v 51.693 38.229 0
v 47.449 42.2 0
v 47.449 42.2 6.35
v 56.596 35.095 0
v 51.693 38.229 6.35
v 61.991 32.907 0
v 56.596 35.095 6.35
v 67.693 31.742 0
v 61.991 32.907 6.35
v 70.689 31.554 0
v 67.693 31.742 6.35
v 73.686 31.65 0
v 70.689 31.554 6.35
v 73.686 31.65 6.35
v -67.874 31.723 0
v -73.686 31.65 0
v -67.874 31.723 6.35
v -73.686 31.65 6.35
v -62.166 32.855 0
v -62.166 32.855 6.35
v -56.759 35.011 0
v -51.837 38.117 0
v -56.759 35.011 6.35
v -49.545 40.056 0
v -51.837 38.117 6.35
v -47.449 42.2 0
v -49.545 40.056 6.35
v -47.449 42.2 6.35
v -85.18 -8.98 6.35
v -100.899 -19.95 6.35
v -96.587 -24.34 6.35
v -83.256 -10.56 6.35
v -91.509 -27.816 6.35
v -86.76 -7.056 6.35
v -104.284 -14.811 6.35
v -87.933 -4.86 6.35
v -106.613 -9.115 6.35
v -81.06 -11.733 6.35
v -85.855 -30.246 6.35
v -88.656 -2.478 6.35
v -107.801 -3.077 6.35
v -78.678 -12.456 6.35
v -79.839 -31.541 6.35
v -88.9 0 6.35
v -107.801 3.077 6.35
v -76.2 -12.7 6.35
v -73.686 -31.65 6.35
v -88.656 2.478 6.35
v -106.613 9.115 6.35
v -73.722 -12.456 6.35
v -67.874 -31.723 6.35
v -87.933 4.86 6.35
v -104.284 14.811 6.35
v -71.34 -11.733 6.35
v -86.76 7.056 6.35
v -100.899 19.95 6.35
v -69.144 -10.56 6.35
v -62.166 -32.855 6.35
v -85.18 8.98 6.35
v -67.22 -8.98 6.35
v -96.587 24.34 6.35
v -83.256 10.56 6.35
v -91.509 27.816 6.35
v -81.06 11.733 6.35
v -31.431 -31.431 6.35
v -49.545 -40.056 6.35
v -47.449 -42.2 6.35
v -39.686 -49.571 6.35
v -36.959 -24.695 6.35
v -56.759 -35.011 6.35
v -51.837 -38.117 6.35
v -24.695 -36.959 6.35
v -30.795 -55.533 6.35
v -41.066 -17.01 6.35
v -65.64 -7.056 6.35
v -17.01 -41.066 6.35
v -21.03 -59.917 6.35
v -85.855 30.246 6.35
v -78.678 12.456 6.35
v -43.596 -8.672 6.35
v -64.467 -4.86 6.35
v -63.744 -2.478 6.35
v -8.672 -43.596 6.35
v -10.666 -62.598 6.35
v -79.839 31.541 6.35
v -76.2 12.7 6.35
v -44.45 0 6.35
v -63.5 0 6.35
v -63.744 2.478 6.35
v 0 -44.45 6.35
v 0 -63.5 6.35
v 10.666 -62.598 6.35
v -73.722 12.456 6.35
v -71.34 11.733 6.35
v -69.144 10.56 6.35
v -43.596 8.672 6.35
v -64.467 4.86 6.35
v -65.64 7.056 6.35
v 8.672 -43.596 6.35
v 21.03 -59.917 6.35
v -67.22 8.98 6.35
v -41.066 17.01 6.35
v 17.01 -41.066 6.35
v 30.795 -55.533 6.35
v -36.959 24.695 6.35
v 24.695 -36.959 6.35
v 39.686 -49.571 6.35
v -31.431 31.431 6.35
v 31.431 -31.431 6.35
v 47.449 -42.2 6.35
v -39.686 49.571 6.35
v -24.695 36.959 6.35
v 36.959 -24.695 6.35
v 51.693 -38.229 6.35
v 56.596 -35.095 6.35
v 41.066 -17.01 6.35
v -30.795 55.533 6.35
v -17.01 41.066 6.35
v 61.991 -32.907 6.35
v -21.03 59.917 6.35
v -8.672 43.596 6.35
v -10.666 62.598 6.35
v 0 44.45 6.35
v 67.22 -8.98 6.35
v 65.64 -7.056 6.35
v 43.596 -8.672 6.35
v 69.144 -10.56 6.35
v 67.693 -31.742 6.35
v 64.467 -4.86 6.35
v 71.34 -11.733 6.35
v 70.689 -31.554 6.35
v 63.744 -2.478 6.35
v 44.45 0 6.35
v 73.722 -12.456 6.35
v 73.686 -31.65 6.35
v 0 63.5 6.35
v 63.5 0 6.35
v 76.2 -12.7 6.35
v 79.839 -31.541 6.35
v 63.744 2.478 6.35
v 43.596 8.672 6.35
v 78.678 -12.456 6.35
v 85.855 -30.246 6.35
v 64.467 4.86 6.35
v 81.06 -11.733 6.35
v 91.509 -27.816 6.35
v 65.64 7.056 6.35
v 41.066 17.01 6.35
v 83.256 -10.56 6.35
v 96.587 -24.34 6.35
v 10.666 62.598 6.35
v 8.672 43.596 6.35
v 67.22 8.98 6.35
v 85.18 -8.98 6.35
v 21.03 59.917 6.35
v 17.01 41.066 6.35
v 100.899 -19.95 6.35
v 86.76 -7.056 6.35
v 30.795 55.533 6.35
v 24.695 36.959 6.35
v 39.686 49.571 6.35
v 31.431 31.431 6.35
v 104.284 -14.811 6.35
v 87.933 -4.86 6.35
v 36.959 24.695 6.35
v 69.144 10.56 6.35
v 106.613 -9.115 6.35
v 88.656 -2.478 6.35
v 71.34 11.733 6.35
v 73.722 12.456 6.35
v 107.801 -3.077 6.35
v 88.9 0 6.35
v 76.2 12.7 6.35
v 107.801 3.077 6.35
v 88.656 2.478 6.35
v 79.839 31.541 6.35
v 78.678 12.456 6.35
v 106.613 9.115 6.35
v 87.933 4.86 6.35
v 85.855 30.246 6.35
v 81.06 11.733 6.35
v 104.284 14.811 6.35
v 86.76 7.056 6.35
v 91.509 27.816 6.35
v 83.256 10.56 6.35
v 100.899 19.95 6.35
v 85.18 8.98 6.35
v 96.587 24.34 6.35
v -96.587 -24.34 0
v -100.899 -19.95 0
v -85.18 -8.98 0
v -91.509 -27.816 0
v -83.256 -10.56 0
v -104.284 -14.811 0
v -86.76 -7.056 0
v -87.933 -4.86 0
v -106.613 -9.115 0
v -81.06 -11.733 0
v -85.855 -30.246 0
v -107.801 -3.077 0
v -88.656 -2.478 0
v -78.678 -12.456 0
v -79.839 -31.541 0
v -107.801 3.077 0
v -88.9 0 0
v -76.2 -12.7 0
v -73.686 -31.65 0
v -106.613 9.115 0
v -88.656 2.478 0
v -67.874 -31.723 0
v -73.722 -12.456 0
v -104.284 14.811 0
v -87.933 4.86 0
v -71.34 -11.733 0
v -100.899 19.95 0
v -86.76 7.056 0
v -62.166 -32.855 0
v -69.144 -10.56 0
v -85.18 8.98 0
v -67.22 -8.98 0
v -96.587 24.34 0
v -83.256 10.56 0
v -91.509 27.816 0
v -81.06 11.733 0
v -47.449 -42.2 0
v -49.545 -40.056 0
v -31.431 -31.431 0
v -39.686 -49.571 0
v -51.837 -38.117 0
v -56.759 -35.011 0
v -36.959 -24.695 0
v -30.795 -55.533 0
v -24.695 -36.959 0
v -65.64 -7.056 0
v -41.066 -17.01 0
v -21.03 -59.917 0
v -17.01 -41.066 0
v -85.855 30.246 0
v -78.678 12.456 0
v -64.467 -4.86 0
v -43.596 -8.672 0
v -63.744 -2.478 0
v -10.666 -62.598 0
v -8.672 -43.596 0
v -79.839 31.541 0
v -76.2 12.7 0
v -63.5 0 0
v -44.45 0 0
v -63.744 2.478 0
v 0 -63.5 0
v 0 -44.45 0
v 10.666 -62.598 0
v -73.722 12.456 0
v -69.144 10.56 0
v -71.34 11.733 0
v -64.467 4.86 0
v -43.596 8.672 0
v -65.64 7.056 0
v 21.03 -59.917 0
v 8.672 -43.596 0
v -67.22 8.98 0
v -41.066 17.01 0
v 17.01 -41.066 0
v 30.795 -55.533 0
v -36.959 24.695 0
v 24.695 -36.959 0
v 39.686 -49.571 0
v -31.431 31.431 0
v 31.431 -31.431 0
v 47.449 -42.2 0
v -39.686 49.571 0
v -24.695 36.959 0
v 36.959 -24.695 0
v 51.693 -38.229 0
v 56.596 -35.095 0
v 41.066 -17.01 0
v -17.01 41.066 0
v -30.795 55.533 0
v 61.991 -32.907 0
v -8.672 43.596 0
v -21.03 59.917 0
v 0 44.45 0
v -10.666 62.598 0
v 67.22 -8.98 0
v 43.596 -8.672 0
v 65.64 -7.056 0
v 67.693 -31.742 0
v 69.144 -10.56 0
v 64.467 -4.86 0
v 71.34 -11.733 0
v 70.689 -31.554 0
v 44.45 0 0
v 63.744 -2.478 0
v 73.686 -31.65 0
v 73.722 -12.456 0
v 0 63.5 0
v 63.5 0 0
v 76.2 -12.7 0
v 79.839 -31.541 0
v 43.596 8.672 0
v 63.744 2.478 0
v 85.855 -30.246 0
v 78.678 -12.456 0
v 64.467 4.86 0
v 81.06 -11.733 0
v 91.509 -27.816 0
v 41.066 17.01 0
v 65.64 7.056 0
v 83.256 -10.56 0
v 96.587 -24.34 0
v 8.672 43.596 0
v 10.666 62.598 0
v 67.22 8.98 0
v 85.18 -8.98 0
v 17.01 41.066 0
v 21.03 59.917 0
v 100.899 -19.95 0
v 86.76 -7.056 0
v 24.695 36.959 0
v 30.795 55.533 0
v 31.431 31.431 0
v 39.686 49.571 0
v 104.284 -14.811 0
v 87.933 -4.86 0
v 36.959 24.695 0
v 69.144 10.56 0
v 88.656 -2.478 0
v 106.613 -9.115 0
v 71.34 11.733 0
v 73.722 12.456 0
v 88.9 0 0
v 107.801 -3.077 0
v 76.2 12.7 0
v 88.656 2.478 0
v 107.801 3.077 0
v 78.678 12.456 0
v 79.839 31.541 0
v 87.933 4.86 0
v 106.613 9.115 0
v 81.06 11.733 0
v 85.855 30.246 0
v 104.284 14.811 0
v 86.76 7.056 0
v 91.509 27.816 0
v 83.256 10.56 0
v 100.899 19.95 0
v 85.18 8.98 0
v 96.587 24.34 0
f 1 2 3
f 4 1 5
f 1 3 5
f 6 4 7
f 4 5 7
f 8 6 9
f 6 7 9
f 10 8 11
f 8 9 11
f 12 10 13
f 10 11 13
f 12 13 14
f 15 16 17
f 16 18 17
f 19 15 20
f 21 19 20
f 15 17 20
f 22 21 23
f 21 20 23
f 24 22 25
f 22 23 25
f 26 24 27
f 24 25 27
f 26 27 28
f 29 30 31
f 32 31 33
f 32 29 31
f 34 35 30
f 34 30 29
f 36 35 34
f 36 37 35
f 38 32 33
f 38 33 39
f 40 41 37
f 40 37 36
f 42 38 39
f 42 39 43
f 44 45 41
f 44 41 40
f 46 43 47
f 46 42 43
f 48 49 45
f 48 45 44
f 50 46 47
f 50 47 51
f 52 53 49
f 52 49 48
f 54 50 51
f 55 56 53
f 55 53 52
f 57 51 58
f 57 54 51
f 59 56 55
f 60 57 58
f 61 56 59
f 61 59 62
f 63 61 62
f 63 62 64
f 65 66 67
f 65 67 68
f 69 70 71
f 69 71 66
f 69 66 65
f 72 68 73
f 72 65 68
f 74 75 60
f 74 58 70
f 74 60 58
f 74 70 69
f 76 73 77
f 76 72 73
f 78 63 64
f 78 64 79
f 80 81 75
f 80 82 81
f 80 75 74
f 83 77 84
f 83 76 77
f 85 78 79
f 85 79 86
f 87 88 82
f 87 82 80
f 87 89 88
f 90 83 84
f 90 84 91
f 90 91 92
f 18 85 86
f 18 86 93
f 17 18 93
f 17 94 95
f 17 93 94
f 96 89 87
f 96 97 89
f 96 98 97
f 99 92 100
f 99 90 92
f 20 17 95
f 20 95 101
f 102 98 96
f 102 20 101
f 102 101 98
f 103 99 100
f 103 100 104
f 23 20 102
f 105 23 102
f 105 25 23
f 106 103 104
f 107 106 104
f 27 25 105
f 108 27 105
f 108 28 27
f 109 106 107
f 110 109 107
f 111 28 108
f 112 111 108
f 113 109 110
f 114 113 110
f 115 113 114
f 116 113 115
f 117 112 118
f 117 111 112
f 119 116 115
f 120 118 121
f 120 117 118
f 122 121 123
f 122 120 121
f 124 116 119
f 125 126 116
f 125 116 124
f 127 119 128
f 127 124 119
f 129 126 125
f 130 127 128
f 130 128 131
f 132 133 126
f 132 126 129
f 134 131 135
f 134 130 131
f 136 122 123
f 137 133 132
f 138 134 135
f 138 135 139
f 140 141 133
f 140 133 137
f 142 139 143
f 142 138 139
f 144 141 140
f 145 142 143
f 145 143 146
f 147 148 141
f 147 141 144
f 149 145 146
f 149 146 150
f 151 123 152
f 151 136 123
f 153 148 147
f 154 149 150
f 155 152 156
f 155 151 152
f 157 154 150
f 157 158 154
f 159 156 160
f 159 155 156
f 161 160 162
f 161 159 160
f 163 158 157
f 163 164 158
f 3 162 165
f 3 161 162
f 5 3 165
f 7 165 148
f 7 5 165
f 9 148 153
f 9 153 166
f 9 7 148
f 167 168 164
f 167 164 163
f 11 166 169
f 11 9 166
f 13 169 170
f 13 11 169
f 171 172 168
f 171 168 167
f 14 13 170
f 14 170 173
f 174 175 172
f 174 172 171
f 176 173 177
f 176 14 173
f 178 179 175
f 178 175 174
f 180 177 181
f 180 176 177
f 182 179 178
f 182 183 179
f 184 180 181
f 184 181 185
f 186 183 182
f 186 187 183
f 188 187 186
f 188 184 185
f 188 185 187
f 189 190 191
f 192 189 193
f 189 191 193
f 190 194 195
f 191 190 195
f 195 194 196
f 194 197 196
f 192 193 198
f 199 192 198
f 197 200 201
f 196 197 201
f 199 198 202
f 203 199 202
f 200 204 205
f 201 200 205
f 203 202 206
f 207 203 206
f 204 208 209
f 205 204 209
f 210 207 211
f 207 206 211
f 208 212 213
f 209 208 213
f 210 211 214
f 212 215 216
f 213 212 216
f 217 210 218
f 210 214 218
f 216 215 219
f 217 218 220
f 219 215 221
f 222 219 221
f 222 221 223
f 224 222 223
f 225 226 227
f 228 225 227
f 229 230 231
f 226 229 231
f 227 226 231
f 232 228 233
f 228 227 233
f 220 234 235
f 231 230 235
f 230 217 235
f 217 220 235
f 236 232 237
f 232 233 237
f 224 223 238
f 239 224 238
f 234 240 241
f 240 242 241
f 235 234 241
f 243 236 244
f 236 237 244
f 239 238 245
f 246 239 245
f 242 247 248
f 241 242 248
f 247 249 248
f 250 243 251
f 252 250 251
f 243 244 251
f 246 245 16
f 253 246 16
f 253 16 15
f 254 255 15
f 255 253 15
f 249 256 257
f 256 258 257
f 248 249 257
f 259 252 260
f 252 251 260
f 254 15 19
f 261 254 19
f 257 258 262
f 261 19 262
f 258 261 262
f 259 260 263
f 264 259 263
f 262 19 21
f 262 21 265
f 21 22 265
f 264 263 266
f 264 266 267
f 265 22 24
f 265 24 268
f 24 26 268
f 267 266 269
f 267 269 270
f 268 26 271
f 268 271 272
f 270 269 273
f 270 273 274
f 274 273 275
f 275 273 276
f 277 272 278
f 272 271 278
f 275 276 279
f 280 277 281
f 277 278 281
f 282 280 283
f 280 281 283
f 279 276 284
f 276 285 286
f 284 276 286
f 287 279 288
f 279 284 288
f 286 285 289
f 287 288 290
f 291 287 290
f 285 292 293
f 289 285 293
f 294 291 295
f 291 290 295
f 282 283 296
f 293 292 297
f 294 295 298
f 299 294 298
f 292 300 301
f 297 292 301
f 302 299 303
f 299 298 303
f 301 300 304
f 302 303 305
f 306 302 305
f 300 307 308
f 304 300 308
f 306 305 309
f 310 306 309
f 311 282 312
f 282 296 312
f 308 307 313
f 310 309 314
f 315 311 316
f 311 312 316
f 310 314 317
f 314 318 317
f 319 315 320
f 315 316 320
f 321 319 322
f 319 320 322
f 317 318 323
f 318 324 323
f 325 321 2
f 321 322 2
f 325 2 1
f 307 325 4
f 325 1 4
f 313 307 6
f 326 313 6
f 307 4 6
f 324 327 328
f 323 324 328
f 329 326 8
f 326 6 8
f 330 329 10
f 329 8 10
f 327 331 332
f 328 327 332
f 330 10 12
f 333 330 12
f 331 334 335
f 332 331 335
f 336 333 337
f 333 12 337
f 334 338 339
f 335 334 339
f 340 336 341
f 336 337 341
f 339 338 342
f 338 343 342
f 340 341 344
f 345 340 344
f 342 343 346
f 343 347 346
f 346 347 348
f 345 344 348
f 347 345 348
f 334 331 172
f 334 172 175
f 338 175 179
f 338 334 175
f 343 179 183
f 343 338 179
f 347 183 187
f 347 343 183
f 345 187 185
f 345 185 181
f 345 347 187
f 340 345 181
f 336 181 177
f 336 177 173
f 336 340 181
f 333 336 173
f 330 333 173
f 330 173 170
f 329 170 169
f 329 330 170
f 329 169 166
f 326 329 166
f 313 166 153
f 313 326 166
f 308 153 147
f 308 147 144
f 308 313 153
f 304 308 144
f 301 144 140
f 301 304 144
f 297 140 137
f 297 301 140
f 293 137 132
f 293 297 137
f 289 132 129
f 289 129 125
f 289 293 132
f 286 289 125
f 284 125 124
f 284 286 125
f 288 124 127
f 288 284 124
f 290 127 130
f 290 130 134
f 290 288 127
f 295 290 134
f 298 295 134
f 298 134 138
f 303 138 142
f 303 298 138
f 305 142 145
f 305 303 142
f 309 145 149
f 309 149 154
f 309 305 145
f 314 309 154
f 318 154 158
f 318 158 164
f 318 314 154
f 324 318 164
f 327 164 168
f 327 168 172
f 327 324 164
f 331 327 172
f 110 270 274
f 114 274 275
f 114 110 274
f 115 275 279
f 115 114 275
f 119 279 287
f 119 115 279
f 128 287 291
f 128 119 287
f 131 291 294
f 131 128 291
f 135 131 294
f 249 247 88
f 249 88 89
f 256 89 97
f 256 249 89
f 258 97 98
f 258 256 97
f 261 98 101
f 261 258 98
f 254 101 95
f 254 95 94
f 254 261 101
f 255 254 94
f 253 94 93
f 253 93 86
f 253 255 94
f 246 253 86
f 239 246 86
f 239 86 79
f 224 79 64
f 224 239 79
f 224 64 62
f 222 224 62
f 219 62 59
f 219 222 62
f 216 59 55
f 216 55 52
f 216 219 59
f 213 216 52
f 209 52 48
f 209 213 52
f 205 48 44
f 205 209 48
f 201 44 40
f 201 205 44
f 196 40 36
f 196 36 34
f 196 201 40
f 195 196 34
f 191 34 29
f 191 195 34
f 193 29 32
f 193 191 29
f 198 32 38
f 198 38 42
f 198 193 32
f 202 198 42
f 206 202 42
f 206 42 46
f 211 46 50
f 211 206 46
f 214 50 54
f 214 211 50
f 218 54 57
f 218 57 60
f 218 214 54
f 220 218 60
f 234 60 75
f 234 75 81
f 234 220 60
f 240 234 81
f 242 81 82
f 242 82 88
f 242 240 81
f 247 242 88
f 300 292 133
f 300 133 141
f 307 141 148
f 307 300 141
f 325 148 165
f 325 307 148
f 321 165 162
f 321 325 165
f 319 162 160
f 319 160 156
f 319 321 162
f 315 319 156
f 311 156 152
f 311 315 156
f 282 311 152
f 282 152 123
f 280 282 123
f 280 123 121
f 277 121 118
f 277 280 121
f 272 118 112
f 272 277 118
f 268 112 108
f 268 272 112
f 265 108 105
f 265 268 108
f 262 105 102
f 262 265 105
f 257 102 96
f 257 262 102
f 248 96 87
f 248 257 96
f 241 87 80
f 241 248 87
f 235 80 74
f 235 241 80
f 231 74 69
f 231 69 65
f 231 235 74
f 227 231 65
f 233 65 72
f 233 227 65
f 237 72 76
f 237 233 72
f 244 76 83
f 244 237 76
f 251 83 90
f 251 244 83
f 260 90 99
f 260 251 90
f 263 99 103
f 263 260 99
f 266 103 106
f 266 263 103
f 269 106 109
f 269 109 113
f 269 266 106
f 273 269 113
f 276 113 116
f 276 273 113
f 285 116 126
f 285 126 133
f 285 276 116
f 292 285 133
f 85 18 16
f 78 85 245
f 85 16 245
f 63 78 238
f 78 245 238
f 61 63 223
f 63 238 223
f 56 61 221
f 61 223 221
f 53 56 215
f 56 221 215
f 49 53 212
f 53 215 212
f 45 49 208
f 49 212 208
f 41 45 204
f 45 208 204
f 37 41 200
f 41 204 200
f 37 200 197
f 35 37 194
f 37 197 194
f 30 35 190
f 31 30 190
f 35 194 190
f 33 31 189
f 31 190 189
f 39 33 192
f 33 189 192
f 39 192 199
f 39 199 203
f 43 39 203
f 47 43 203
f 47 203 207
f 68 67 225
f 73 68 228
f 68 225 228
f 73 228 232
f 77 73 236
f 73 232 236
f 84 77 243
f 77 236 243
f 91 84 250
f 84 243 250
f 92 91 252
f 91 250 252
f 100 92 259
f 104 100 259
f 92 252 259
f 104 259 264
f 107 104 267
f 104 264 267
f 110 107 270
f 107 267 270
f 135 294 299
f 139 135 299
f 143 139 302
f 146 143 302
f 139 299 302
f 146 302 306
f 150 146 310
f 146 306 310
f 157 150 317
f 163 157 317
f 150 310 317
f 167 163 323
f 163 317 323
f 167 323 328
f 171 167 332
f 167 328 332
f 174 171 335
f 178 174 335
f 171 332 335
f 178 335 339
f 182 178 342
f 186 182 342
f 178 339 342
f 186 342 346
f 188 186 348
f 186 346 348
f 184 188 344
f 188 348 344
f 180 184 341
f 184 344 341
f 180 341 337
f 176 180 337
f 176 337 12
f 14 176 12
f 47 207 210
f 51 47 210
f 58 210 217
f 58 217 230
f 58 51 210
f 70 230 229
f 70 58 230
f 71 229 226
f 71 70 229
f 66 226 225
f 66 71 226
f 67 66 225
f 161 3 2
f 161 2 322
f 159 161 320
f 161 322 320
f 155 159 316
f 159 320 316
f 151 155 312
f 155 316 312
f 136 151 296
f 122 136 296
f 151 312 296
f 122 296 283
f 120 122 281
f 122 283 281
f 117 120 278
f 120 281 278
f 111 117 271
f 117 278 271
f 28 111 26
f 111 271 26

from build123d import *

# Parameters (mm, degrees)
F0_R     = 12.7
F0_R_2   = 44.45
F1_DEPTH = 6.35
F2_R     = 31.75


# Not quite as in the source:
# - a feature names something its author has since deleted; it is built from what else it names


with BuildPart() as f1:
    # F0 (on Top) → F1 (new body)
    with BuildSketch(Plane.XY):
        with BuildLine():
            ThreePointArc((-57.94375, 25.976370723), (-107.95, 0), (-57.94375, -25.976370723))
            ThreePointArc((-57.94375, -25.976370723), (0, -63.5), (57.94375, -25.976370723))
            ThreePointArc((57.94375, -25.976370723), (107.95, 0), (57.94375, 25.976370723))
            ThreePointArc((57.94375, 25.976370723), (0, 63.5), (-57.94375, 25.976370723))
        make_face()
        with Locations((-76.2, 0)):
            Circle(F0_R, mode=Mode.SUBTRACT)
        Circle(F0_R_2, mode=Mode.SUBTRACT)
        with Locations((76.2, 0)):
            Circle(F0_R, mode=Mode.SUBTRACT)
    extrude(amount=F1_DEPTH)

    # F2
    f2_edges = [f1.edges().sort_by_distance(p)[0] for p in [
        (-57.94375, -25.976371, 3.175),
        (57.94375, -25.976371, 3.175),
        (-57.94375, 25.976371, 3.175),
        (57.94375, 25.976371, 3.175),
    ]]
    fillet(f2_edges, radius=F2_R)


solid = f1.part
